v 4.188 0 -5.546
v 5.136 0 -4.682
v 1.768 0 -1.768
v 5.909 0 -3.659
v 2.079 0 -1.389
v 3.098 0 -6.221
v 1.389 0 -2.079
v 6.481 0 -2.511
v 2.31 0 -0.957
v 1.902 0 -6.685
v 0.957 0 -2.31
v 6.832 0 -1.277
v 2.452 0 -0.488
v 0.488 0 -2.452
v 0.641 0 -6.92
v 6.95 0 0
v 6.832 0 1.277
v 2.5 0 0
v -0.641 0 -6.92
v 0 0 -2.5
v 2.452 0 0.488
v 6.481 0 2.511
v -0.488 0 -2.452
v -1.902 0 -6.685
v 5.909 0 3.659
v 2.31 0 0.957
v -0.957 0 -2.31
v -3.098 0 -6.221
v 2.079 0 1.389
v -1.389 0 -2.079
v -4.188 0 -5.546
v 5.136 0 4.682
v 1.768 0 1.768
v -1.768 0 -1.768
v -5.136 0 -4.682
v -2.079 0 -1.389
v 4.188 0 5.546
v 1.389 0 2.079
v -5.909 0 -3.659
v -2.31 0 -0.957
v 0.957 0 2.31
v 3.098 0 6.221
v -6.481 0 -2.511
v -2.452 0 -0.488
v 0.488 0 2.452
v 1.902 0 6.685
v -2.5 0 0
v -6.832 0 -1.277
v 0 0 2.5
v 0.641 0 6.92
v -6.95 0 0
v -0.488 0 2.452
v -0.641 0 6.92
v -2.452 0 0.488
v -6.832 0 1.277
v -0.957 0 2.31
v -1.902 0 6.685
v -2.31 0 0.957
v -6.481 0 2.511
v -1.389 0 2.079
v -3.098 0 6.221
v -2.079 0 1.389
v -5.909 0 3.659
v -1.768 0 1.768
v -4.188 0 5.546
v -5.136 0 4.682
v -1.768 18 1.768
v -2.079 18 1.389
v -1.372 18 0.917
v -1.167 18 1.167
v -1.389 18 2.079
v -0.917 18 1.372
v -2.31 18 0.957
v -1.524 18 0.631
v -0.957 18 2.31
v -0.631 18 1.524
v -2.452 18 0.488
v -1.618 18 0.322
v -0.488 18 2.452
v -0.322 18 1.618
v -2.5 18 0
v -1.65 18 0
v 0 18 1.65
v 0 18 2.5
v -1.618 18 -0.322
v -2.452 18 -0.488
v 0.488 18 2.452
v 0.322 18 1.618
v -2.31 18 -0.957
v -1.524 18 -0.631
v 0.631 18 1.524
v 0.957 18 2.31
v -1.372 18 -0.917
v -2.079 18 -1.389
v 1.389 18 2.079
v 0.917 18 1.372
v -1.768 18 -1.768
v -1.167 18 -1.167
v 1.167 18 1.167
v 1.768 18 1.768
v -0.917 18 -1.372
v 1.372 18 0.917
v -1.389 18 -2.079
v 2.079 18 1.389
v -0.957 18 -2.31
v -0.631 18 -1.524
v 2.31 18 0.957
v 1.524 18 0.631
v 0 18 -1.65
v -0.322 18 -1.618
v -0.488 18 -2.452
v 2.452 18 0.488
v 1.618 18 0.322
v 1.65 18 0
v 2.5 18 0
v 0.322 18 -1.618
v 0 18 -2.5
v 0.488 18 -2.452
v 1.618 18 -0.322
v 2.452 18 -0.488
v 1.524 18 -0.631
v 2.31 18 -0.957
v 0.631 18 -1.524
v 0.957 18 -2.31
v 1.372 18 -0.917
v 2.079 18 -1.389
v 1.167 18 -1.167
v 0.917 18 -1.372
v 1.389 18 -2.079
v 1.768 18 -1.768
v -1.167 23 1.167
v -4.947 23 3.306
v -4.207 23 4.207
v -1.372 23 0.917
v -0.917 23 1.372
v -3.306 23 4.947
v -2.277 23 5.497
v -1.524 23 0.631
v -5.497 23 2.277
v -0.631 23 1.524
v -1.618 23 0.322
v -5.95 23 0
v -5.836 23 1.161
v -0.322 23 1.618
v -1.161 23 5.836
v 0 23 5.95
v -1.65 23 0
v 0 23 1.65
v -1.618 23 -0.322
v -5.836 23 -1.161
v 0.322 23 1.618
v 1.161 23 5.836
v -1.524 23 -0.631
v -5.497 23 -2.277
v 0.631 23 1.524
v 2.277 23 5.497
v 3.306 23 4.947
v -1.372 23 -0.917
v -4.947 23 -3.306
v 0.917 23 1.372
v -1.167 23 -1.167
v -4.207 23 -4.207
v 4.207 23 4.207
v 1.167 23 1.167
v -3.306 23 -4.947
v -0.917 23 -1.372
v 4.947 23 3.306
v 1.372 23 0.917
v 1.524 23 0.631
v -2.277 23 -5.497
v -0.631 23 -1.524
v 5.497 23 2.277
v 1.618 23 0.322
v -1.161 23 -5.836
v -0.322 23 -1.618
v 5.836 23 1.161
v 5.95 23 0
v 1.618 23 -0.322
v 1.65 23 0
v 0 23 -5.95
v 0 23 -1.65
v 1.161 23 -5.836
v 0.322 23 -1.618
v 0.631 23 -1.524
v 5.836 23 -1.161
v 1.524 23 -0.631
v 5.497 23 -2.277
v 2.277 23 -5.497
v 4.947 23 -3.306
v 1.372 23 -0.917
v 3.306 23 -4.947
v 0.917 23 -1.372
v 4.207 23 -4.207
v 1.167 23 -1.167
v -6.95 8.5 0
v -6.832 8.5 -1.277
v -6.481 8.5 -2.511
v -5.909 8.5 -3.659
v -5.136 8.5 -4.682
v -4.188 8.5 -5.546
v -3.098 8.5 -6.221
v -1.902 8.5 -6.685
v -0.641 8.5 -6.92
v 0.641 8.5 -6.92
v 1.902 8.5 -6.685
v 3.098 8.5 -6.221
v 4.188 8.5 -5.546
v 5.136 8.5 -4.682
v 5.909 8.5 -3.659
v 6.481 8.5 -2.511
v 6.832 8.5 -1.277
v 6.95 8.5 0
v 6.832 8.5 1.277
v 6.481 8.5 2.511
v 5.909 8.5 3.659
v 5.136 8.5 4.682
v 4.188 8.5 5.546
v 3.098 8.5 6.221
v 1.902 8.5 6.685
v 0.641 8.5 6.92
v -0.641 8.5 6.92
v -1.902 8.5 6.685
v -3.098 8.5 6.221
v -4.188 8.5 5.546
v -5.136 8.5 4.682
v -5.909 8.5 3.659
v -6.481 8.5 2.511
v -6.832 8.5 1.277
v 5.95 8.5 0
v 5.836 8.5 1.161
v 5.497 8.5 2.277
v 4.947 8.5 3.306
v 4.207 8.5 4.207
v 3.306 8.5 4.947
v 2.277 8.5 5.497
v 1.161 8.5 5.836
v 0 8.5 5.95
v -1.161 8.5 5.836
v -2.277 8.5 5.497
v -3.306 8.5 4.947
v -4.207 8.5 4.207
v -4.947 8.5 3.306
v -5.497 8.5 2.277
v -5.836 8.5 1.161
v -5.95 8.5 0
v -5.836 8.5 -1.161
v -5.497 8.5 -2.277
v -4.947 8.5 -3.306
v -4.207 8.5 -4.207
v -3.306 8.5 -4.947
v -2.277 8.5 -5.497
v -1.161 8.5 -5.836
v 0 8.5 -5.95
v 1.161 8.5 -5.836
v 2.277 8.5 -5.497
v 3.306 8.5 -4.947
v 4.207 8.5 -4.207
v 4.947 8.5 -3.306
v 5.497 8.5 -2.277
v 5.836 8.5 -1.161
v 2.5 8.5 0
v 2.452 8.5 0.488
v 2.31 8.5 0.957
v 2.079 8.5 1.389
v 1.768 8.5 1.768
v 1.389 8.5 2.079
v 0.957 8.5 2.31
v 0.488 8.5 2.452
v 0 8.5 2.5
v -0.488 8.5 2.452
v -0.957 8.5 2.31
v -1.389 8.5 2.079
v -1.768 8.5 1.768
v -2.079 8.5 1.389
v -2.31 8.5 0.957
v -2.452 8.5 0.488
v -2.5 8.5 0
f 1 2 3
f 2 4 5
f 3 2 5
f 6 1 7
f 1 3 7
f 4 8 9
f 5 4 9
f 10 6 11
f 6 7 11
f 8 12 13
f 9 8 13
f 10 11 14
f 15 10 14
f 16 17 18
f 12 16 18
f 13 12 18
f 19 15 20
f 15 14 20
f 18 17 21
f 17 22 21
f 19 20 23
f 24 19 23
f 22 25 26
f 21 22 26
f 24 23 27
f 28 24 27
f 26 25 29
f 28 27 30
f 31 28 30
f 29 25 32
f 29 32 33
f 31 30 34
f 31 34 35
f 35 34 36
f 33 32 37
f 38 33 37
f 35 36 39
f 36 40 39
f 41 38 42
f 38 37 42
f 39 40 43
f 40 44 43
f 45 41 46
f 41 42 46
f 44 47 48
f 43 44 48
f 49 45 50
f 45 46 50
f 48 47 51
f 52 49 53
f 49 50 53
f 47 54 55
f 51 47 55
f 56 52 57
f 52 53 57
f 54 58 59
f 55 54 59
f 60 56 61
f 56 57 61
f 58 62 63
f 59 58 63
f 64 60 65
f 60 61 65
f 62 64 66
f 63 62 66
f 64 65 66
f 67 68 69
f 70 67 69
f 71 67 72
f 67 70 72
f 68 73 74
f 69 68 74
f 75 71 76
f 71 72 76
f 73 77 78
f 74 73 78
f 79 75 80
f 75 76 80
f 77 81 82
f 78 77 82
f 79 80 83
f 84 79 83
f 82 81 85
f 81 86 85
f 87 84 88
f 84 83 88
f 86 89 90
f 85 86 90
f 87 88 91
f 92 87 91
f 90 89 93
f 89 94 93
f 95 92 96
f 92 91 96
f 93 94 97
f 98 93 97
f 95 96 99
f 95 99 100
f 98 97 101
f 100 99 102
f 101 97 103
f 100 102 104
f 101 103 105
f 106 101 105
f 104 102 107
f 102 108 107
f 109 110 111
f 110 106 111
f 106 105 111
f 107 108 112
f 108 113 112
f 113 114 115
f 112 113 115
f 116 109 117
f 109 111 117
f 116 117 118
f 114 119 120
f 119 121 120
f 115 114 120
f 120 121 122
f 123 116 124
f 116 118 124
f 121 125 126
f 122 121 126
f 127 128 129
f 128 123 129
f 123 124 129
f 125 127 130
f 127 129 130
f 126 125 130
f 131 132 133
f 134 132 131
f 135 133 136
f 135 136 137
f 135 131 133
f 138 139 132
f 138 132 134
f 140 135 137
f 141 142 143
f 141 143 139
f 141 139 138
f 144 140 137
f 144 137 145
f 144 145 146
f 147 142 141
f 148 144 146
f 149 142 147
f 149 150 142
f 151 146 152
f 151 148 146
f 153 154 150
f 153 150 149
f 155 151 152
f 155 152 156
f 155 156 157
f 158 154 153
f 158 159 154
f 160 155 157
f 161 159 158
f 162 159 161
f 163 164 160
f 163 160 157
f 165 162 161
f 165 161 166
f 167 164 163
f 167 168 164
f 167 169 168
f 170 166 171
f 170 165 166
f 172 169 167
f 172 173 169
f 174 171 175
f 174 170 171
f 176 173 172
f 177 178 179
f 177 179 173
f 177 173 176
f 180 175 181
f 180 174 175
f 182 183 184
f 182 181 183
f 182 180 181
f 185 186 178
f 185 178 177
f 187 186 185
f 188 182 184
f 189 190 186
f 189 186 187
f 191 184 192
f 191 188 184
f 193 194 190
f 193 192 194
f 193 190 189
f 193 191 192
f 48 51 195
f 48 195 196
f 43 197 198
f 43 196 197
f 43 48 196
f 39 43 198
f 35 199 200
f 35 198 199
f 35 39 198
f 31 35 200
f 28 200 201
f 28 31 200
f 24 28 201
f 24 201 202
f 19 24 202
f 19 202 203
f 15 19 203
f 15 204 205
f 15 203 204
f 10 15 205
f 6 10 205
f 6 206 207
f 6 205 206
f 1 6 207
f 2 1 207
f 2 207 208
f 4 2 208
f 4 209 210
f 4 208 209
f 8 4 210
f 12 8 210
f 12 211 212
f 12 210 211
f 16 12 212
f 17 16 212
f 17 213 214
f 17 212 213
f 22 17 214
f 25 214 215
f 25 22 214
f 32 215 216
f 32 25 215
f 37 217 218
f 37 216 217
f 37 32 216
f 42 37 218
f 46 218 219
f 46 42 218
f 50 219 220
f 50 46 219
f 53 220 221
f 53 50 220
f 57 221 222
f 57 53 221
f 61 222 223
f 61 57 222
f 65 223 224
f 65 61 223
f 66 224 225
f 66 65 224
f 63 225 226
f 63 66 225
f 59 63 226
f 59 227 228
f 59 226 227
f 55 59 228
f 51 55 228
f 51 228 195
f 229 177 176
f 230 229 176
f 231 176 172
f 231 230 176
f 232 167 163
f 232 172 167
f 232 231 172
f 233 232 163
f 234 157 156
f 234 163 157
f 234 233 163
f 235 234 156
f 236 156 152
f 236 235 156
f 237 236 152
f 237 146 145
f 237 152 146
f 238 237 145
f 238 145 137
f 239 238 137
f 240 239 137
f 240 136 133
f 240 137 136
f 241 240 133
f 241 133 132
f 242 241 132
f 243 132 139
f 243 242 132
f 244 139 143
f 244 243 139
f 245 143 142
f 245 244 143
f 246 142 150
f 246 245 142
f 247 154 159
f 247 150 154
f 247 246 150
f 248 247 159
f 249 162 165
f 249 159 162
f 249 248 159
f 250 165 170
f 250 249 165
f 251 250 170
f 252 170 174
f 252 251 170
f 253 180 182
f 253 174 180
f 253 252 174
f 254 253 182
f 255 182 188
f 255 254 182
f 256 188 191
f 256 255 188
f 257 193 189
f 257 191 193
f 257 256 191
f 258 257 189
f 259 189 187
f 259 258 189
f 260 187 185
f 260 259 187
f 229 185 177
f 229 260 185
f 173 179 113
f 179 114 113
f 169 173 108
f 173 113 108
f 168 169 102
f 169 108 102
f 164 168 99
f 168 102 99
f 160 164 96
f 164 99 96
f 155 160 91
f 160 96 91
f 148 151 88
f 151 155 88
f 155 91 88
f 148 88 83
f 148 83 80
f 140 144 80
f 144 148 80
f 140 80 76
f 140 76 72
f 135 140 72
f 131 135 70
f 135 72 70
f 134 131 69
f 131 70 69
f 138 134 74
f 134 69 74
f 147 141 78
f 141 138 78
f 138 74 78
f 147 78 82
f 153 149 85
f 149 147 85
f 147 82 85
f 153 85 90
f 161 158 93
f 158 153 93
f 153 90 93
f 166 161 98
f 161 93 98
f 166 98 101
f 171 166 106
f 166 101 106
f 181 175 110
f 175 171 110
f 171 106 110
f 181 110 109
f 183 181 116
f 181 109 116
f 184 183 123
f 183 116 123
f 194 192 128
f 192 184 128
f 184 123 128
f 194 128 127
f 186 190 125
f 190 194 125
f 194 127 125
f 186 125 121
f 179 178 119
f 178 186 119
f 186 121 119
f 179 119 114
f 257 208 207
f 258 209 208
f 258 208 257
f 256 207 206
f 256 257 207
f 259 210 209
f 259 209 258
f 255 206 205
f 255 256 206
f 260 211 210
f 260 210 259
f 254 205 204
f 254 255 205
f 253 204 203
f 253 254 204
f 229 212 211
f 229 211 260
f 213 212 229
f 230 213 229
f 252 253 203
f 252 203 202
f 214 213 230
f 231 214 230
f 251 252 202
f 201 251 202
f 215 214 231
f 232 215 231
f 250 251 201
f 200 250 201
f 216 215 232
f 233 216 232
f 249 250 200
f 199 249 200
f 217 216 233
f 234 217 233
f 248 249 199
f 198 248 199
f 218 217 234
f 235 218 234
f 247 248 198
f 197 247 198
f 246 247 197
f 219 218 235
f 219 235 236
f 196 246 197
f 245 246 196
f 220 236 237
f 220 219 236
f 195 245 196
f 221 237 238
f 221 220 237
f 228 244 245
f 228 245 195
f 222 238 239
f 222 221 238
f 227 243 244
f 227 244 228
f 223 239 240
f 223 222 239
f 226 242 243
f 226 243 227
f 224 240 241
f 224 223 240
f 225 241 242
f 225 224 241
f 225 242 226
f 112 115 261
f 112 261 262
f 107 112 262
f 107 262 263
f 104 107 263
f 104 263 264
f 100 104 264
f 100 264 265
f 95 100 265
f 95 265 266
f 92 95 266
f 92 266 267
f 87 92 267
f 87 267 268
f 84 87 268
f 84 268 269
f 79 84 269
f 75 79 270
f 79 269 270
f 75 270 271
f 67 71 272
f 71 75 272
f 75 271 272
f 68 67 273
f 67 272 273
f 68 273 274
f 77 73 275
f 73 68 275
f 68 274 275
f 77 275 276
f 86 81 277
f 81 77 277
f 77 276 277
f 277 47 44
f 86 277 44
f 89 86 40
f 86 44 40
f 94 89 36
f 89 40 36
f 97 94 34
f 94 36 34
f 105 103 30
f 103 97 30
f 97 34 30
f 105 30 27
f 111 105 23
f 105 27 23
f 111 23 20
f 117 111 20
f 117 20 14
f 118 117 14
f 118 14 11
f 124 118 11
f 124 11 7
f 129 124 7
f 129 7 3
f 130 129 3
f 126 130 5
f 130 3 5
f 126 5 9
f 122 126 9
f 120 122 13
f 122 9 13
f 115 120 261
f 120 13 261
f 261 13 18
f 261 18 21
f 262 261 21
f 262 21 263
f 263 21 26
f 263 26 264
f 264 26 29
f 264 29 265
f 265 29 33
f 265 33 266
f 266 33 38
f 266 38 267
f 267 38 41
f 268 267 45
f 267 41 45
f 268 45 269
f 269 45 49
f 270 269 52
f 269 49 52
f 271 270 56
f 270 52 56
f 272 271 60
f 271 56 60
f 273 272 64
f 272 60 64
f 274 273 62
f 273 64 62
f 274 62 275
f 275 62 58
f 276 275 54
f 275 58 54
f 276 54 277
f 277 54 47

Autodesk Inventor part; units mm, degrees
ref_plane "YZ Plane" through (0, 0, 0) normal (1, 0, 0) x (0, 1, 0)
ref_plane "XZ Plane" through (0, 0, 0) normal (0, 1, 0) x (-1, 0, 0)
ref_plane "XY Plane" through (0, 0, 0) normal (0, 0, 1) x (1, 0, 0)
sketch "Esquisse1" plane through (0, 0, 0) normal (0, 1, 0) x (-1, 0, 0)
  circle A0 centre (0, 0) radius 6.95
  circle A1 centre (0, 0) radius 2.5
  dimension "d0" = 13.9
  dimension "d1" = 5
extrude "Extrusion1" add sketch "Esquisse1" along normal blind 8.5
sketch "Esquisse2" plane through (0, 8.5, 0) normal (0, 1, 0) x (1, 0, 0)
  circle A0 centre (0, 0) radius 5.95
  circle A1 centre (0, 0) radius 2.5 projected
  dimension "d4" = 11.9
extrude "Extrusion2" add sketch "Esquisse2" along normal blind 9.5
sketch "Esquisse3" plane through (0, 18, 0) normal (0, 1, 0) x (1, 0, 0)
  circle A0 centre (0, 0) radius 5.95 projected
  circle A1 centre (0, 0) radius 1.65
  dimension "d3" = 0
  dimension "d7" = 3.3
extrude "Extrusion3" add sketch "Esquisse3" along normal blind 5
thread "Filetage1" size "M4x0.7" class "6H" standard "ANSI Metric M Profile" length 25.616
properties part number "moyeu"
